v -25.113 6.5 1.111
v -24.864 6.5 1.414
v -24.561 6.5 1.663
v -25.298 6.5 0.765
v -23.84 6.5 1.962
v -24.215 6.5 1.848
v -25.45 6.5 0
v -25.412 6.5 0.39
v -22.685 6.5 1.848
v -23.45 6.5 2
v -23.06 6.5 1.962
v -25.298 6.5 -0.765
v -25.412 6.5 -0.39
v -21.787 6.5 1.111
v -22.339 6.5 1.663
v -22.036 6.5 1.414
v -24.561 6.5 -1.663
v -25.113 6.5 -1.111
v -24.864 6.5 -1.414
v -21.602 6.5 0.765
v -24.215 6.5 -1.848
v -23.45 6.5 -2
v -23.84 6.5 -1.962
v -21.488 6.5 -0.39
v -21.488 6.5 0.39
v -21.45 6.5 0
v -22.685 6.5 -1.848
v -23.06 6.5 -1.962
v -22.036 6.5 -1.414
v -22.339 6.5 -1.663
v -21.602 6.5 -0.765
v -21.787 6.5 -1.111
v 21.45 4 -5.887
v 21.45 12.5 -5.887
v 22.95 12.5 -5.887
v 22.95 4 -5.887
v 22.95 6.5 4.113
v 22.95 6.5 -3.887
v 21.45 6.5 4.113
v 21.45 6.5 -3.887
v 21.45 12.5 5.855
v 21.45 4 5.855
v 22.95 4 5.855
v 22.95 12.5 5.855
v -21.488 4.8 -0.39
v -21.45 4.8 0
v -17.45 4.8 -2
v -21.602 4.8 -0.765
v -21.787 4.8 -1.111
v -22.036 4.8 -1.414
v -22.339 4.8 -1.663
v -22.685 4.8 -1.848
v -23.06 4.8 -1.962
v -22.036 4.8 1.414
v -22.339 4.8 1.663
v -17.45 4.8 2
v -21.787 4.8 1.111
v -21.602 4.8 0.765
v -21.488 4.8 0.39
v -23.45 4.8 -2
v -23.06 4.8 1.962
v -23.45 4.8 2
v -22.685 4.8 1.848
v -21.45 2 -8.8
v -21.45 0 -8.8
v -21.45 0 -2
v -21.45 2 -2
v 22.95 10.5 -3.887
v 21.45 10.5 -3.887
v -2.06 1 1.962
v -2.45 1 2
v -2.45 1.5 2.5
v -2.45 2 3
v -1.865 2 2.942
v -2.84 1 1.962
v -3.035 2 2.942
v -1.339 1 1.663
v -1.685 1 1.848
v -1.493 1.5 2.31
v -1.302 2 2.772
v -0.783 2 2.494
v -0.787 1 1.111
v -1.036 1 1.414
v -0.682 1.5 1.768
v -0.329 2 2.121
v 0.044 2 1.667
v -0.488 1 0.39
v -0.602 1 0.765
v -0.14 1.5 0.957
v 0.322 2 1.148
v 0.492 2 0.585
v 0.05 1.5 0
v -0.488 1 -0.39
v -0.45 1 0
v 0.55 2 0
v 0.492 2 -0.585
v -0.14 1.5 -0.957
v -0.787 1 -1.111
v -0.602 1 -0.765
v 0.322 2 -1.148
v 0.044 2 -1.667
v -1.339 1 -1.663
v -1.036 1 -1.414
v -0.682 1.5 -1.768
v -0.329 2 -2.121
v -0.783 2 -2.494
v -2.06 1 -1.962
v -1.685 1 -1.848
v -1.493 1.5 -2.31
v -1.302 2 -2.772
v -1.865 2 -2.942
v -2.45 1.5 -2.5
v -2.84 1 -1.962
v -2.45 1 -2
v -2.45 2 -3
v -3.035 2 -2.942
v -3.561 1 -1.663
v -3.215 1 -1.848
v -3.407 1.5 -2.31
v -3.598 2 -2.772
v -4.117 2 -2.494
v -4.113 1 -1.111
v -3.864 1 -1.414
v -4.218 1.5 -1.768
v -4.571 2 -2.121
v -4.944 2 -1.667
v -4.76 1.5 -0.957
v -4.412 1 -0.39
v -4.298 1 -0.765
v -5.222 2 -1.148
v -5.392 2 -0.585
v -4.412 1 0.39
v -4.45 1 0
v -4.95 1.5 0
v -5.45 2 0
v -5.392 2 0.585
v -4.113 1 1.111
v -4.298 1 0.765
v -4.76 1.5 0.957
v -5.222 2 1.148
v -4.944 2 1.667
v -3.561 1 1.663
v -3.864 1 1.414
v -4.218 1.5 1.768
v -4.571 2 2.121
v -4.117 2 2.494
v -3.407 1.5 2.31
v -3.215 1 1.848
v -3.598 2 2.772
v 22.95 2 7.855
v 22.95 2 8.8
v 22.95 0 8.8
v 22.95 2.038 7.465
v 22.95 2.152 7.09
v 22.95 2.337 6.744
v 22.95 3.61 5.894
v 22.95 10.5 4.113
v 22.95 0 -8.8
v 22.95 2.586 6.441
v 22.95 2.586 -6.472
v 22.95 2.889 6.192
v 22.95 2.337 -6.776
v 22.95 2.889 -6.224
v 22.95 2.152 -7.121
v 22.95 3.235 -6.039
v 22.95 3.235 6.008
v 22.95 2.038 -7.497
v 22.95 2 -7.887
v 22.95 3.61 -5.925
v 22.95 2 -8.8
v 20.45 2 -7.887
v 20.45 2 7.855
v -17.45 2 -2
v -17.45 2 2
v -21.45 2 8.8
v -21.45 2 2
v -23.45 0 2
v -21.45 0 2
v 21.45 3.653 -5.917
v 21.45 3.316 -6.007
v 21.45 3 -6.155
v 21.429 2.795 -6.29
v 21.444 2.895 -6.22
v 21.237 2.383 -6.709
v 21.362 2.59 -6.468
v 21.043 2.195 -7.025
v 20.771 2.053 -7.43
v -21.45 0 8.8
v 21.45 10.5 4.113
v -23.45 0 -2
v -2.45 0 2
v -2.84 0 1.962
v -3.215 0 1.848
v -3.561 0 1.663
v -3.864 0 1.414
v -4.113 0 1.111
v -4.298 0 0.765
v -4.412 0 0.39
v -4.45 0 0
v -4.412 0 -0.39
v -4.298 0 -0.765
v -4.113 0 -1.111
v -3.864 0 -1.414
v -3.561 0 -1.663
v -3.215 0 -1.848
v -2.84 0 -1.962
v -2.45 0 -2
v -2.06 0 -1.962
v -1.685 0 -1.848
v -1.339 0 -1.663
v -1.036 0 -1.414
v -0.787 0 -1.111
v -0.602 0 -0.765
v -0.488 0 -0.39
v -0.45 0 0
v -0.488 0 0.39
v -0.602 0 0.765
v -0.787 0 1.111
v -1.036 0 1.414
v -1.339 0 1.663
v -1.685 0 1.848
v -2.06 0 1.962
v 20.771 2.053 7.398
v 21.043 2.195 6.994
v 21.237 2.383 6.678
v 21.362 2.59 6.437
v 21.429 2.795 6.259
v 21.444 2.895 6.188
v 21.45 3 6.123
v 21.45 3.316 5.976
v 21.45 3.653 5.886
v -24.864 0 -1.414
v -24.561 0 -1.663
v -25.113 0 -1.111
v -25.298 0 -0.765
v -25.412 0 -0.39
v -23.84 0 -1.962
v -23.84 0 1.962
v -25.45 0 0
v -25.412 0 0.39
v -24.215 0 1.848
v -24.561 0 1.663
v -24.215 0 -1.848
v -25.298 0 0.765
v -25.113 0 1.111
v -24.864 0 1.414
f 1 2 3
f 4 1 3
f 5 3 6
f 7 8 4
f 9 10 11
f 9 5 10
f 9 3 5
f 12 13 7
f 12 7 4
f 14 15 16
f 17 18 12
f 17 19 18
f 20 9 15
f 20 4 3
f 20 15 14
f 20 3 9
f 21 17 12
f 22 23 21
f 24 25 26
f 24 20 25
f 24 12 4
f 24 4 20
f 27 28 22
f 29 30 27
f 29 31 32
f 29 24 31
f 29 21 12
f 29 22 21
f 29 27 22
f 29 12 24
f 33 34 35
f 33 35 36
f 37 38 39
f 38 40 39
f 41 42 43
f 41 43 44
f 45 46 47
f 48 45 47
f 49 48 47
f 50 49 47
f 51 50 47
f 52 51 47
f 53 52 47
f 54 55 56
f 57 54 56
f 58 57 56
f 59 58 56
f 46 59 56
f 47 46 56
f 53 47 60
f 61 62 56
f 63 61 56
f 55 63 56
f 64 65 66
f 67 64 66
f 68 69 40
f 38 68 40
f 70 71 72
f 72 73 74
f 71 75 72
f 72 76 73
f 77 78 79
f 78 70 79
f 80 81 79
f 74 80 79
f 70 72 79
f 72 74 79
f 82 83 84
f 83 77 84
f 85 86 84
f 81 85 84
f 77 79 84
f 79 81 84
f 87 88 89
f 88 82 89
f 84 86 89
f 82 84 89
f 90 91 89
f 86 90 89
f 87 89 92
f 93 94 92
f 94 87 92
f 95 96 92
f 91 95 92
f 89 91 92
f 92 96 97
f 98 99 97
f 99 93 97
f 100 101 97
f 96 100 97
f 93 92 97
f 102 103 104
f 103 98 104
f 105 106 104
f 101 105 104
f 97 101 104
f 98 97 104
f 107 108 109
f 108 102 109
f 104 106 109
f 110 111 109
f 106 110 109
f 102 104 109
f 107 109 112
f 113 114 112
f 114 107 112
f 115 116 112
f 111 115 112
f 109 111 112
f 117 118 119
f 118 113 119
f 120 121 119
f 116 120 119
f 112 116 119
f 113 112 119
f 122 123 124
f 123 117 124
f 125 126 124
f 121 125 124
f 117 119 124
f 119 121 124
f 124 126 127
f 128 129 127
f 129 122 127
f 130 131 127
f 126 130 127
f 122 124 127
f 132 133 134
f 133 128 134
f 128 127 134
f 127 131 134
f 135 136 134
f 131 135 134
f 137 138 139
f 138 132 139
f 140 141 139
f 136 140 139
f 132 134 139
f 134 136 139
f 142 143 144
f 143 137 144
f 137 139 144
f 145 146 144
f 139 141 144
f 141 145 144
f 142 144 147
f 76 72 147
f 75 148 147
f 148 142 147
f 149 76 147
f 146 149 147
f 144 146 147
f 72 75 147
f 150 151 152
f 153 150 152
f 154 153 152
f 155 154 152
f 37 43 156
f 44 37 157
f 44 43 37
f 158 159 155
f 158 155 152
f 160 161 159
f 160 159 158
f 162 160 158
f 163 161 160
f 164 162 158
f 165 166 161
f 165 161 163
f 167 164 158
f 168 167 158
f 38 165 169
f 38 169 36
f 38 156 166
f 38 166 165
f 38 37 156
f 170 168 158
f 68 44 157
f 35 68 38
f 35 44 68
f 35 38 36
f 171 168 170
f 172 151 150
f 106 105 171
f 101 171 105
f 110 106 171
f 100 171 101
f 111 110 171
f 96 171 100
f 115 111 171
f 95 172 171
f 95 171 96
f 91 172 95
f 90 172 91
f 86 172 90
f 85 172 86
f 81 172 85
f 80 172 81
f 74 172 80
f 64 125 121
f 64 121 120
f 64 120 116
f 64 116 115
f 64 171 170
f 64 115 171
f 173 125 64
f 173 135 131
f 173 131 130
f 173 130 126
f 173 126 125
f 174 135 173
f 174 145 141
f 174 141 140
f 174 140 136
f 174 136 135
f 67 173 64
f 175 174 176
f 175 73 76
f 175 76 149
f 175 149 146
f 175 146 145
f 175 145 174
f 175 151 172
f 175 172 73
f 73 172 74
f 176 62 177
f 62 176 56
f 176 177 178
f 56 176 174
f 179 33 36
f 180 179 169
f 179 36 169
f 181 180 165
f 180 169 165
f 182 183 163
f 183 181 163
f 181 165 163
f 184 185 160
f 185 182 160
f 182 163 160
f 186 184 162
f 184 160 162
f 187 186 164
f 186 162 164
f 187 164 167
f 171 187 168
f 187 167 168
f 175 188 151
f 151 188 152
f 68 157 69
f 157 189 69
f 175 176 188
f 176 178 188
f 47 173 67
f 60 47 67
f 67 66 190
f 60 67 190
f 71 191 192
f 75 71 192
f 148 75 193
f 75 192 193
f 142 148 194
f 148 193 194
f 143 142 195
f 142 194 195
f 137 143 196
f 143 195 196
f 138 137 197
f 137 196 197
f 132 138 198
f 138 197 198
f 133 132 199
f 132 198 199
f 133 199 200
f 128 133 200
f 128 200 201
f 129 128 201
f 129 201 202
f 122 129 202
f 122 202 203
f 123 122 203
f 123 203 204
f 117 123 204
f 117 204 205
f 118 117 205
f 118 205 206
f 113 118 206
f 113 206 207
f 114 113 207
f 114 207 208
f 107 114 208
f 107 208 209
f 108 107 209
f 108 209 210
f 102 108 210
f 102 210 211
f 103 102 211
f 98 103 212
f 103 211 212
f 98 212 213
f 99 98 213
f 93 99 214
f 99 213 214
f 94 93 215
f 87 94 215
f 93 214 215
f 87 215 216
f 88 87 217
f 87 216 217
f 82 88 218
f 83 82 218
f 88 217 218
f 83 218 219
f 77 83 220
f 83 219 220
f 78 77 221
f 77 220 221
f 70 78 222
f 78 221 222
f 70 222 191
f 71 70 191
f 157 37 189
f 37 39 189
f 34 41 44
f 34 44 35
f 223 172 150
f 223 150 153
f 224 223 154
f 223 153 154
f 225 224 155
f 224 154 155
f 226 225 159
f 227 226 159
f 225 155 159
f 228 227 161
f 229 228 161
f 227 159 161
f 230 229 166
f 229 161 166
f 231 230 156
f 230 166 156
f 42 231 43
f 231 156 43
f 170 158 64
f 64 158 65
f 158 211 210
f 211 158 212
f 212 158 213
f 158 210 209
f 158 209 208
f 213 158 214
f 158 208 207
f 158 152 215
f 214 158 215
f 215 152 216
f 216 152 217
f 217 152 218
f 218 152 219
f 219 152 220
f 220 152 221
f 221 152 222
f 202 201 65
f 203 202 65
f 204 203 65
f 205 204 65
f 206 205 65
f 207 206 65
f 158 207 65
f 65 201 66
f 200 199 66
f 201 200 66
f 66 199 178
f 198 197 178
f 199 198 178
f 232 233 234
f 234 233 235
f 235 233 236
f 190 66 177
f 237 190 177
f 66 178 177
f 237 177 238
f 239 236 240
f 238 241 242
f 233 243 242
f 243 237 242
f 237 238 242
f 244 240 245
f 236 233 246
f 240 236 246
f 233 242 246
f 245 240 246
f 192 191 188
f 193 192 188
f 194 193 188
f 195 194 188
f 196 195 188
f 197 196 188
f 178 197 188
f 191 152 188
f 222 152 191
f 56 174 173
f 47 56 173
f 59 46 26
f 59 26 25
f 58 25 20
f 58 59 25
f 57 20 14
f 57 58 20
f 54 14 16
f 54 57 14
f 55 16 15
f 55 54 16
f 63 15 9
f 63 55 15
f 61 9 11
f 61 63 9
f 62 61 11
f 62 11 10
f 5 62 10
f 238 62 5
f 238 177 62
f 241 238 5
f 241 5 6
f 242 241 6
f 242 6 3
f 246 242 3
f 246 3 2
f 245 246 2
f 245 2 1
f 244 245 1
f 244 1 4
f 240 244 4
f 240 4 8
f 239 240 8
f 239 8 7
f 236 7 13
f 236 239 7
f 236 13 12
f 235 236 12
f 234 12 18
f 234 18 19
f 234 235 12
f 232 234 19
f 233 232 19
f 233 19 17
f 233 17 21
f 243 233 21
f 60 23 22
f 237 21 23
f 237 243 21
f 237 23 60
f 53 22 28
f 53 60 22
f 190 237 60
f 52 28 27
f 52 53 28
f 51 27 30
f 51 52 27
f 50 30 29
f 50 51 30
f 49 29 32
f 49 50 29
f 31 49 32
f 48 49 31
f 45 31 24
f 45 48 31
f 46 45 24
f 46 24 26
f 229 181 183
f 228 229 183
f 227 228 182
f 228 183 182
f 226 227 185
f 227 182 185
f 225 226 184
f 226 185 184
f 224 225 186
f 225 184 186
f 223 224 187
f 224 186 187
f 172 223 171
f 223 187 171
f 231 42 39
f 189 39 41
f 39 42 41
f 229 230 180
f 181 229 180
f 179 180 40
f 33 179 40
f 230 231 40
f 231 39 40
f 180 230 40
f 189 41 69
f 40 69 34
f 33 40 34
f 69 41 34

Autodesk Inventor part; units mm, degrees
ref_plane "YZ Plane" through (0, 0, 0) normal (1, 0, 0) x (0, 1, 0)
ref_plane "XZ Plane" through (0, 0, 0) normal (0, 1, 0) x (-1, 0, 0)
ref_plane "XY Plane" through (0, 0, 0) normal (0, 0, 1) x (1, 0, 0)
sketch "Esquisse1" plane through (0, 0, 0) normal (0, 1, 0) x (-1, 0, 0)
  line L0 (21.45, 8.8) -> (-21.45, 8.8)
  line L1 (-21.45, 8.8) -> (-21.45, -8.8)
  line L2 (-21.45, -8.8) -> (21.45, -8.8)
  line L3 (21.45, -8.8) -> (21.45, 8.8)
  line L4 (21.45, 8.8) -> (-21.45, -8.8) construction
  line L5 (-21.45, 8.8) -> (21.45, -8.8) construction
  point P0 (0, 0)
  dimension "d0" = 42.9
  dimension "d1" = 17.6
extrude "Extrusion1" add sketch "Esquisse1" along normal blind 2
sketch "Esquisse2" plane through (21.45, 0, 8.8) normal (1, 0, 0) x (0, 0, -1)
  line L0 (4.6867, 10.5) -> (12.6867, 10.5)
  line L1 (12.6867, 10.5) -> (12.6867, 6.5)
  line L2 (12.6867, 6.5) -> (4.6867, 6.5)
  line L3 (4.6867, 6.5) -> (4.6867, 10.5)
  line L4 (4.6867, 10.5) -> (12.6867, 6.5) construction
  line L5 (12.6867, 10.5) -> (4.6867, 6.5) construction
  line L6 (2.9446, 12.5) -> (14.6867, 12.5)
  line L7 (14.6867, 12.5) -> (14.6867, 4.3203)
  line L8 (2.9446, 4.6719) -> (2.9446, 12.5)
  line L9 (2.9446, 12.5) -> (14.6867, 4.3203) construction
  line L10 (14.6867, 12.5) -> (2.9446, 4.6719) construction
  line L11 (0, 2) -> (17.6, 2) projected
  line L12 (2.9446, 4.6719) -> (2.9446, 0)
  line L13 (0, 0) -> (17.6, 0) projected
  line L14 (14.6867, 4.3203) -> (14.6867, 0)
  line L15 (2.9446, 0) -> (14.6867, 0)
  point P0 (8.8, 0)
  point P1 (8.6867, 8.5)
  point P2 (8.6867, 8.5)
  dimension "d4" = 4.5
  dimension "d6" = 2
  dimension "d7" = 8
  dimension "d8" = 4
extrude "Extrusion2" add sketch "Esquisse2" along normal blind 1.5
sketch "Esquisse4" plane through (0, 2, 0) normal (0, 1, 0) x (1, 0, 0)
  line L0 (-21.45, 8.8) -> (-21.45, -8.8) projected
  point P0 (0, 0)
  point P1 (-2.45, 0)
  dimension "d18" = 19
hole "Perçage2" at (-2.45, 2, 0) direction (0, -1, 0) diameter 4 end through all countersink diameter 6 countersink angle 90
sketch "Esquisse5" plane through (21.45, 0, 8.8) normal (1, 0, 0) x (0, 0, -1)
  line L0 (0, 0) -> (2.9446, 0) projected
  line L1 (2.9446, 2) -> (14.6867, 2) projected
  line L2 (0, 0) -> (2.9446, 0)
  line L3 (2.9446, 0) -> (2.9446, 2)
  line L4 (2.9446, 2) -> (0, 2)
  line L5 (0, 2) -> (0, 0)
  line L6 (2.9446, 0) -> (14.6867, 0) projected
  line L7 (14.6867, 2) -> (17.6, 2) projected
  line L8 (14.6867, 0) -> (17.6, 0)
  line L9 (17.6, 0) -> (17.6, 2)
  line L10 (17.6, 2) -> (14.6867, 2)
  line L11 (14.6867, 2) -> (14.6867, 0)
  point P0 (8.8, 0)
extrude "Extrusion3" add sketch "Esquisse5" along normal up to surface (1.5 mm away) contours L5 L4 L3 L0 | L11 L7 L9 L8
fillet "Congé1" radius 2 2 edges at (22.2, 2, 5.8554) (22.2, 2, -5.8867)
fillet "Congé2" radius 1 1 edges at (21.45, 2, -0.0157)
sketch "Esquisse6" plane through (0, 0, 0) normal (0, -1, 0) x (1, 0, 0)
  circle A0 centre (-23.45, 0) radius 2
  line L0 (-21.45, -8.8) -> (-21.45, 8.8) projected
  line L1 (-23.45, 2) -> (-17.45, 2)
  line L2 (-17.45, 2) -> (-17.45, -2)
  line L3 (-17.45, -2) -> (-23.45, -2)
  line L4 (0, 0) -> (4.0498, 0)
  dimension "d30" = 4
  dimension "d31" = 4
extrude "Extrusion4" add sketch "Esquisse6" against normal blind 4.8
sketch "Esquisse7" plane through (0, 4.8, 0) normal (0, 1, 0) x (1, 0, 0)
  circle A0 centre (-23.45, 0) radius 2
  arc A1 (-23.45, 2) -> (-23.45, -2) centre (-23.45, 0) ccw projected
  point P0 (0, 0)
extrude "Extrusion5" add sketch "Esquisse7" along normal blind 1.7
equation "\"d6\" = d5"
equation "\"d5\" = 2"
properties part number "arduino_holder"
